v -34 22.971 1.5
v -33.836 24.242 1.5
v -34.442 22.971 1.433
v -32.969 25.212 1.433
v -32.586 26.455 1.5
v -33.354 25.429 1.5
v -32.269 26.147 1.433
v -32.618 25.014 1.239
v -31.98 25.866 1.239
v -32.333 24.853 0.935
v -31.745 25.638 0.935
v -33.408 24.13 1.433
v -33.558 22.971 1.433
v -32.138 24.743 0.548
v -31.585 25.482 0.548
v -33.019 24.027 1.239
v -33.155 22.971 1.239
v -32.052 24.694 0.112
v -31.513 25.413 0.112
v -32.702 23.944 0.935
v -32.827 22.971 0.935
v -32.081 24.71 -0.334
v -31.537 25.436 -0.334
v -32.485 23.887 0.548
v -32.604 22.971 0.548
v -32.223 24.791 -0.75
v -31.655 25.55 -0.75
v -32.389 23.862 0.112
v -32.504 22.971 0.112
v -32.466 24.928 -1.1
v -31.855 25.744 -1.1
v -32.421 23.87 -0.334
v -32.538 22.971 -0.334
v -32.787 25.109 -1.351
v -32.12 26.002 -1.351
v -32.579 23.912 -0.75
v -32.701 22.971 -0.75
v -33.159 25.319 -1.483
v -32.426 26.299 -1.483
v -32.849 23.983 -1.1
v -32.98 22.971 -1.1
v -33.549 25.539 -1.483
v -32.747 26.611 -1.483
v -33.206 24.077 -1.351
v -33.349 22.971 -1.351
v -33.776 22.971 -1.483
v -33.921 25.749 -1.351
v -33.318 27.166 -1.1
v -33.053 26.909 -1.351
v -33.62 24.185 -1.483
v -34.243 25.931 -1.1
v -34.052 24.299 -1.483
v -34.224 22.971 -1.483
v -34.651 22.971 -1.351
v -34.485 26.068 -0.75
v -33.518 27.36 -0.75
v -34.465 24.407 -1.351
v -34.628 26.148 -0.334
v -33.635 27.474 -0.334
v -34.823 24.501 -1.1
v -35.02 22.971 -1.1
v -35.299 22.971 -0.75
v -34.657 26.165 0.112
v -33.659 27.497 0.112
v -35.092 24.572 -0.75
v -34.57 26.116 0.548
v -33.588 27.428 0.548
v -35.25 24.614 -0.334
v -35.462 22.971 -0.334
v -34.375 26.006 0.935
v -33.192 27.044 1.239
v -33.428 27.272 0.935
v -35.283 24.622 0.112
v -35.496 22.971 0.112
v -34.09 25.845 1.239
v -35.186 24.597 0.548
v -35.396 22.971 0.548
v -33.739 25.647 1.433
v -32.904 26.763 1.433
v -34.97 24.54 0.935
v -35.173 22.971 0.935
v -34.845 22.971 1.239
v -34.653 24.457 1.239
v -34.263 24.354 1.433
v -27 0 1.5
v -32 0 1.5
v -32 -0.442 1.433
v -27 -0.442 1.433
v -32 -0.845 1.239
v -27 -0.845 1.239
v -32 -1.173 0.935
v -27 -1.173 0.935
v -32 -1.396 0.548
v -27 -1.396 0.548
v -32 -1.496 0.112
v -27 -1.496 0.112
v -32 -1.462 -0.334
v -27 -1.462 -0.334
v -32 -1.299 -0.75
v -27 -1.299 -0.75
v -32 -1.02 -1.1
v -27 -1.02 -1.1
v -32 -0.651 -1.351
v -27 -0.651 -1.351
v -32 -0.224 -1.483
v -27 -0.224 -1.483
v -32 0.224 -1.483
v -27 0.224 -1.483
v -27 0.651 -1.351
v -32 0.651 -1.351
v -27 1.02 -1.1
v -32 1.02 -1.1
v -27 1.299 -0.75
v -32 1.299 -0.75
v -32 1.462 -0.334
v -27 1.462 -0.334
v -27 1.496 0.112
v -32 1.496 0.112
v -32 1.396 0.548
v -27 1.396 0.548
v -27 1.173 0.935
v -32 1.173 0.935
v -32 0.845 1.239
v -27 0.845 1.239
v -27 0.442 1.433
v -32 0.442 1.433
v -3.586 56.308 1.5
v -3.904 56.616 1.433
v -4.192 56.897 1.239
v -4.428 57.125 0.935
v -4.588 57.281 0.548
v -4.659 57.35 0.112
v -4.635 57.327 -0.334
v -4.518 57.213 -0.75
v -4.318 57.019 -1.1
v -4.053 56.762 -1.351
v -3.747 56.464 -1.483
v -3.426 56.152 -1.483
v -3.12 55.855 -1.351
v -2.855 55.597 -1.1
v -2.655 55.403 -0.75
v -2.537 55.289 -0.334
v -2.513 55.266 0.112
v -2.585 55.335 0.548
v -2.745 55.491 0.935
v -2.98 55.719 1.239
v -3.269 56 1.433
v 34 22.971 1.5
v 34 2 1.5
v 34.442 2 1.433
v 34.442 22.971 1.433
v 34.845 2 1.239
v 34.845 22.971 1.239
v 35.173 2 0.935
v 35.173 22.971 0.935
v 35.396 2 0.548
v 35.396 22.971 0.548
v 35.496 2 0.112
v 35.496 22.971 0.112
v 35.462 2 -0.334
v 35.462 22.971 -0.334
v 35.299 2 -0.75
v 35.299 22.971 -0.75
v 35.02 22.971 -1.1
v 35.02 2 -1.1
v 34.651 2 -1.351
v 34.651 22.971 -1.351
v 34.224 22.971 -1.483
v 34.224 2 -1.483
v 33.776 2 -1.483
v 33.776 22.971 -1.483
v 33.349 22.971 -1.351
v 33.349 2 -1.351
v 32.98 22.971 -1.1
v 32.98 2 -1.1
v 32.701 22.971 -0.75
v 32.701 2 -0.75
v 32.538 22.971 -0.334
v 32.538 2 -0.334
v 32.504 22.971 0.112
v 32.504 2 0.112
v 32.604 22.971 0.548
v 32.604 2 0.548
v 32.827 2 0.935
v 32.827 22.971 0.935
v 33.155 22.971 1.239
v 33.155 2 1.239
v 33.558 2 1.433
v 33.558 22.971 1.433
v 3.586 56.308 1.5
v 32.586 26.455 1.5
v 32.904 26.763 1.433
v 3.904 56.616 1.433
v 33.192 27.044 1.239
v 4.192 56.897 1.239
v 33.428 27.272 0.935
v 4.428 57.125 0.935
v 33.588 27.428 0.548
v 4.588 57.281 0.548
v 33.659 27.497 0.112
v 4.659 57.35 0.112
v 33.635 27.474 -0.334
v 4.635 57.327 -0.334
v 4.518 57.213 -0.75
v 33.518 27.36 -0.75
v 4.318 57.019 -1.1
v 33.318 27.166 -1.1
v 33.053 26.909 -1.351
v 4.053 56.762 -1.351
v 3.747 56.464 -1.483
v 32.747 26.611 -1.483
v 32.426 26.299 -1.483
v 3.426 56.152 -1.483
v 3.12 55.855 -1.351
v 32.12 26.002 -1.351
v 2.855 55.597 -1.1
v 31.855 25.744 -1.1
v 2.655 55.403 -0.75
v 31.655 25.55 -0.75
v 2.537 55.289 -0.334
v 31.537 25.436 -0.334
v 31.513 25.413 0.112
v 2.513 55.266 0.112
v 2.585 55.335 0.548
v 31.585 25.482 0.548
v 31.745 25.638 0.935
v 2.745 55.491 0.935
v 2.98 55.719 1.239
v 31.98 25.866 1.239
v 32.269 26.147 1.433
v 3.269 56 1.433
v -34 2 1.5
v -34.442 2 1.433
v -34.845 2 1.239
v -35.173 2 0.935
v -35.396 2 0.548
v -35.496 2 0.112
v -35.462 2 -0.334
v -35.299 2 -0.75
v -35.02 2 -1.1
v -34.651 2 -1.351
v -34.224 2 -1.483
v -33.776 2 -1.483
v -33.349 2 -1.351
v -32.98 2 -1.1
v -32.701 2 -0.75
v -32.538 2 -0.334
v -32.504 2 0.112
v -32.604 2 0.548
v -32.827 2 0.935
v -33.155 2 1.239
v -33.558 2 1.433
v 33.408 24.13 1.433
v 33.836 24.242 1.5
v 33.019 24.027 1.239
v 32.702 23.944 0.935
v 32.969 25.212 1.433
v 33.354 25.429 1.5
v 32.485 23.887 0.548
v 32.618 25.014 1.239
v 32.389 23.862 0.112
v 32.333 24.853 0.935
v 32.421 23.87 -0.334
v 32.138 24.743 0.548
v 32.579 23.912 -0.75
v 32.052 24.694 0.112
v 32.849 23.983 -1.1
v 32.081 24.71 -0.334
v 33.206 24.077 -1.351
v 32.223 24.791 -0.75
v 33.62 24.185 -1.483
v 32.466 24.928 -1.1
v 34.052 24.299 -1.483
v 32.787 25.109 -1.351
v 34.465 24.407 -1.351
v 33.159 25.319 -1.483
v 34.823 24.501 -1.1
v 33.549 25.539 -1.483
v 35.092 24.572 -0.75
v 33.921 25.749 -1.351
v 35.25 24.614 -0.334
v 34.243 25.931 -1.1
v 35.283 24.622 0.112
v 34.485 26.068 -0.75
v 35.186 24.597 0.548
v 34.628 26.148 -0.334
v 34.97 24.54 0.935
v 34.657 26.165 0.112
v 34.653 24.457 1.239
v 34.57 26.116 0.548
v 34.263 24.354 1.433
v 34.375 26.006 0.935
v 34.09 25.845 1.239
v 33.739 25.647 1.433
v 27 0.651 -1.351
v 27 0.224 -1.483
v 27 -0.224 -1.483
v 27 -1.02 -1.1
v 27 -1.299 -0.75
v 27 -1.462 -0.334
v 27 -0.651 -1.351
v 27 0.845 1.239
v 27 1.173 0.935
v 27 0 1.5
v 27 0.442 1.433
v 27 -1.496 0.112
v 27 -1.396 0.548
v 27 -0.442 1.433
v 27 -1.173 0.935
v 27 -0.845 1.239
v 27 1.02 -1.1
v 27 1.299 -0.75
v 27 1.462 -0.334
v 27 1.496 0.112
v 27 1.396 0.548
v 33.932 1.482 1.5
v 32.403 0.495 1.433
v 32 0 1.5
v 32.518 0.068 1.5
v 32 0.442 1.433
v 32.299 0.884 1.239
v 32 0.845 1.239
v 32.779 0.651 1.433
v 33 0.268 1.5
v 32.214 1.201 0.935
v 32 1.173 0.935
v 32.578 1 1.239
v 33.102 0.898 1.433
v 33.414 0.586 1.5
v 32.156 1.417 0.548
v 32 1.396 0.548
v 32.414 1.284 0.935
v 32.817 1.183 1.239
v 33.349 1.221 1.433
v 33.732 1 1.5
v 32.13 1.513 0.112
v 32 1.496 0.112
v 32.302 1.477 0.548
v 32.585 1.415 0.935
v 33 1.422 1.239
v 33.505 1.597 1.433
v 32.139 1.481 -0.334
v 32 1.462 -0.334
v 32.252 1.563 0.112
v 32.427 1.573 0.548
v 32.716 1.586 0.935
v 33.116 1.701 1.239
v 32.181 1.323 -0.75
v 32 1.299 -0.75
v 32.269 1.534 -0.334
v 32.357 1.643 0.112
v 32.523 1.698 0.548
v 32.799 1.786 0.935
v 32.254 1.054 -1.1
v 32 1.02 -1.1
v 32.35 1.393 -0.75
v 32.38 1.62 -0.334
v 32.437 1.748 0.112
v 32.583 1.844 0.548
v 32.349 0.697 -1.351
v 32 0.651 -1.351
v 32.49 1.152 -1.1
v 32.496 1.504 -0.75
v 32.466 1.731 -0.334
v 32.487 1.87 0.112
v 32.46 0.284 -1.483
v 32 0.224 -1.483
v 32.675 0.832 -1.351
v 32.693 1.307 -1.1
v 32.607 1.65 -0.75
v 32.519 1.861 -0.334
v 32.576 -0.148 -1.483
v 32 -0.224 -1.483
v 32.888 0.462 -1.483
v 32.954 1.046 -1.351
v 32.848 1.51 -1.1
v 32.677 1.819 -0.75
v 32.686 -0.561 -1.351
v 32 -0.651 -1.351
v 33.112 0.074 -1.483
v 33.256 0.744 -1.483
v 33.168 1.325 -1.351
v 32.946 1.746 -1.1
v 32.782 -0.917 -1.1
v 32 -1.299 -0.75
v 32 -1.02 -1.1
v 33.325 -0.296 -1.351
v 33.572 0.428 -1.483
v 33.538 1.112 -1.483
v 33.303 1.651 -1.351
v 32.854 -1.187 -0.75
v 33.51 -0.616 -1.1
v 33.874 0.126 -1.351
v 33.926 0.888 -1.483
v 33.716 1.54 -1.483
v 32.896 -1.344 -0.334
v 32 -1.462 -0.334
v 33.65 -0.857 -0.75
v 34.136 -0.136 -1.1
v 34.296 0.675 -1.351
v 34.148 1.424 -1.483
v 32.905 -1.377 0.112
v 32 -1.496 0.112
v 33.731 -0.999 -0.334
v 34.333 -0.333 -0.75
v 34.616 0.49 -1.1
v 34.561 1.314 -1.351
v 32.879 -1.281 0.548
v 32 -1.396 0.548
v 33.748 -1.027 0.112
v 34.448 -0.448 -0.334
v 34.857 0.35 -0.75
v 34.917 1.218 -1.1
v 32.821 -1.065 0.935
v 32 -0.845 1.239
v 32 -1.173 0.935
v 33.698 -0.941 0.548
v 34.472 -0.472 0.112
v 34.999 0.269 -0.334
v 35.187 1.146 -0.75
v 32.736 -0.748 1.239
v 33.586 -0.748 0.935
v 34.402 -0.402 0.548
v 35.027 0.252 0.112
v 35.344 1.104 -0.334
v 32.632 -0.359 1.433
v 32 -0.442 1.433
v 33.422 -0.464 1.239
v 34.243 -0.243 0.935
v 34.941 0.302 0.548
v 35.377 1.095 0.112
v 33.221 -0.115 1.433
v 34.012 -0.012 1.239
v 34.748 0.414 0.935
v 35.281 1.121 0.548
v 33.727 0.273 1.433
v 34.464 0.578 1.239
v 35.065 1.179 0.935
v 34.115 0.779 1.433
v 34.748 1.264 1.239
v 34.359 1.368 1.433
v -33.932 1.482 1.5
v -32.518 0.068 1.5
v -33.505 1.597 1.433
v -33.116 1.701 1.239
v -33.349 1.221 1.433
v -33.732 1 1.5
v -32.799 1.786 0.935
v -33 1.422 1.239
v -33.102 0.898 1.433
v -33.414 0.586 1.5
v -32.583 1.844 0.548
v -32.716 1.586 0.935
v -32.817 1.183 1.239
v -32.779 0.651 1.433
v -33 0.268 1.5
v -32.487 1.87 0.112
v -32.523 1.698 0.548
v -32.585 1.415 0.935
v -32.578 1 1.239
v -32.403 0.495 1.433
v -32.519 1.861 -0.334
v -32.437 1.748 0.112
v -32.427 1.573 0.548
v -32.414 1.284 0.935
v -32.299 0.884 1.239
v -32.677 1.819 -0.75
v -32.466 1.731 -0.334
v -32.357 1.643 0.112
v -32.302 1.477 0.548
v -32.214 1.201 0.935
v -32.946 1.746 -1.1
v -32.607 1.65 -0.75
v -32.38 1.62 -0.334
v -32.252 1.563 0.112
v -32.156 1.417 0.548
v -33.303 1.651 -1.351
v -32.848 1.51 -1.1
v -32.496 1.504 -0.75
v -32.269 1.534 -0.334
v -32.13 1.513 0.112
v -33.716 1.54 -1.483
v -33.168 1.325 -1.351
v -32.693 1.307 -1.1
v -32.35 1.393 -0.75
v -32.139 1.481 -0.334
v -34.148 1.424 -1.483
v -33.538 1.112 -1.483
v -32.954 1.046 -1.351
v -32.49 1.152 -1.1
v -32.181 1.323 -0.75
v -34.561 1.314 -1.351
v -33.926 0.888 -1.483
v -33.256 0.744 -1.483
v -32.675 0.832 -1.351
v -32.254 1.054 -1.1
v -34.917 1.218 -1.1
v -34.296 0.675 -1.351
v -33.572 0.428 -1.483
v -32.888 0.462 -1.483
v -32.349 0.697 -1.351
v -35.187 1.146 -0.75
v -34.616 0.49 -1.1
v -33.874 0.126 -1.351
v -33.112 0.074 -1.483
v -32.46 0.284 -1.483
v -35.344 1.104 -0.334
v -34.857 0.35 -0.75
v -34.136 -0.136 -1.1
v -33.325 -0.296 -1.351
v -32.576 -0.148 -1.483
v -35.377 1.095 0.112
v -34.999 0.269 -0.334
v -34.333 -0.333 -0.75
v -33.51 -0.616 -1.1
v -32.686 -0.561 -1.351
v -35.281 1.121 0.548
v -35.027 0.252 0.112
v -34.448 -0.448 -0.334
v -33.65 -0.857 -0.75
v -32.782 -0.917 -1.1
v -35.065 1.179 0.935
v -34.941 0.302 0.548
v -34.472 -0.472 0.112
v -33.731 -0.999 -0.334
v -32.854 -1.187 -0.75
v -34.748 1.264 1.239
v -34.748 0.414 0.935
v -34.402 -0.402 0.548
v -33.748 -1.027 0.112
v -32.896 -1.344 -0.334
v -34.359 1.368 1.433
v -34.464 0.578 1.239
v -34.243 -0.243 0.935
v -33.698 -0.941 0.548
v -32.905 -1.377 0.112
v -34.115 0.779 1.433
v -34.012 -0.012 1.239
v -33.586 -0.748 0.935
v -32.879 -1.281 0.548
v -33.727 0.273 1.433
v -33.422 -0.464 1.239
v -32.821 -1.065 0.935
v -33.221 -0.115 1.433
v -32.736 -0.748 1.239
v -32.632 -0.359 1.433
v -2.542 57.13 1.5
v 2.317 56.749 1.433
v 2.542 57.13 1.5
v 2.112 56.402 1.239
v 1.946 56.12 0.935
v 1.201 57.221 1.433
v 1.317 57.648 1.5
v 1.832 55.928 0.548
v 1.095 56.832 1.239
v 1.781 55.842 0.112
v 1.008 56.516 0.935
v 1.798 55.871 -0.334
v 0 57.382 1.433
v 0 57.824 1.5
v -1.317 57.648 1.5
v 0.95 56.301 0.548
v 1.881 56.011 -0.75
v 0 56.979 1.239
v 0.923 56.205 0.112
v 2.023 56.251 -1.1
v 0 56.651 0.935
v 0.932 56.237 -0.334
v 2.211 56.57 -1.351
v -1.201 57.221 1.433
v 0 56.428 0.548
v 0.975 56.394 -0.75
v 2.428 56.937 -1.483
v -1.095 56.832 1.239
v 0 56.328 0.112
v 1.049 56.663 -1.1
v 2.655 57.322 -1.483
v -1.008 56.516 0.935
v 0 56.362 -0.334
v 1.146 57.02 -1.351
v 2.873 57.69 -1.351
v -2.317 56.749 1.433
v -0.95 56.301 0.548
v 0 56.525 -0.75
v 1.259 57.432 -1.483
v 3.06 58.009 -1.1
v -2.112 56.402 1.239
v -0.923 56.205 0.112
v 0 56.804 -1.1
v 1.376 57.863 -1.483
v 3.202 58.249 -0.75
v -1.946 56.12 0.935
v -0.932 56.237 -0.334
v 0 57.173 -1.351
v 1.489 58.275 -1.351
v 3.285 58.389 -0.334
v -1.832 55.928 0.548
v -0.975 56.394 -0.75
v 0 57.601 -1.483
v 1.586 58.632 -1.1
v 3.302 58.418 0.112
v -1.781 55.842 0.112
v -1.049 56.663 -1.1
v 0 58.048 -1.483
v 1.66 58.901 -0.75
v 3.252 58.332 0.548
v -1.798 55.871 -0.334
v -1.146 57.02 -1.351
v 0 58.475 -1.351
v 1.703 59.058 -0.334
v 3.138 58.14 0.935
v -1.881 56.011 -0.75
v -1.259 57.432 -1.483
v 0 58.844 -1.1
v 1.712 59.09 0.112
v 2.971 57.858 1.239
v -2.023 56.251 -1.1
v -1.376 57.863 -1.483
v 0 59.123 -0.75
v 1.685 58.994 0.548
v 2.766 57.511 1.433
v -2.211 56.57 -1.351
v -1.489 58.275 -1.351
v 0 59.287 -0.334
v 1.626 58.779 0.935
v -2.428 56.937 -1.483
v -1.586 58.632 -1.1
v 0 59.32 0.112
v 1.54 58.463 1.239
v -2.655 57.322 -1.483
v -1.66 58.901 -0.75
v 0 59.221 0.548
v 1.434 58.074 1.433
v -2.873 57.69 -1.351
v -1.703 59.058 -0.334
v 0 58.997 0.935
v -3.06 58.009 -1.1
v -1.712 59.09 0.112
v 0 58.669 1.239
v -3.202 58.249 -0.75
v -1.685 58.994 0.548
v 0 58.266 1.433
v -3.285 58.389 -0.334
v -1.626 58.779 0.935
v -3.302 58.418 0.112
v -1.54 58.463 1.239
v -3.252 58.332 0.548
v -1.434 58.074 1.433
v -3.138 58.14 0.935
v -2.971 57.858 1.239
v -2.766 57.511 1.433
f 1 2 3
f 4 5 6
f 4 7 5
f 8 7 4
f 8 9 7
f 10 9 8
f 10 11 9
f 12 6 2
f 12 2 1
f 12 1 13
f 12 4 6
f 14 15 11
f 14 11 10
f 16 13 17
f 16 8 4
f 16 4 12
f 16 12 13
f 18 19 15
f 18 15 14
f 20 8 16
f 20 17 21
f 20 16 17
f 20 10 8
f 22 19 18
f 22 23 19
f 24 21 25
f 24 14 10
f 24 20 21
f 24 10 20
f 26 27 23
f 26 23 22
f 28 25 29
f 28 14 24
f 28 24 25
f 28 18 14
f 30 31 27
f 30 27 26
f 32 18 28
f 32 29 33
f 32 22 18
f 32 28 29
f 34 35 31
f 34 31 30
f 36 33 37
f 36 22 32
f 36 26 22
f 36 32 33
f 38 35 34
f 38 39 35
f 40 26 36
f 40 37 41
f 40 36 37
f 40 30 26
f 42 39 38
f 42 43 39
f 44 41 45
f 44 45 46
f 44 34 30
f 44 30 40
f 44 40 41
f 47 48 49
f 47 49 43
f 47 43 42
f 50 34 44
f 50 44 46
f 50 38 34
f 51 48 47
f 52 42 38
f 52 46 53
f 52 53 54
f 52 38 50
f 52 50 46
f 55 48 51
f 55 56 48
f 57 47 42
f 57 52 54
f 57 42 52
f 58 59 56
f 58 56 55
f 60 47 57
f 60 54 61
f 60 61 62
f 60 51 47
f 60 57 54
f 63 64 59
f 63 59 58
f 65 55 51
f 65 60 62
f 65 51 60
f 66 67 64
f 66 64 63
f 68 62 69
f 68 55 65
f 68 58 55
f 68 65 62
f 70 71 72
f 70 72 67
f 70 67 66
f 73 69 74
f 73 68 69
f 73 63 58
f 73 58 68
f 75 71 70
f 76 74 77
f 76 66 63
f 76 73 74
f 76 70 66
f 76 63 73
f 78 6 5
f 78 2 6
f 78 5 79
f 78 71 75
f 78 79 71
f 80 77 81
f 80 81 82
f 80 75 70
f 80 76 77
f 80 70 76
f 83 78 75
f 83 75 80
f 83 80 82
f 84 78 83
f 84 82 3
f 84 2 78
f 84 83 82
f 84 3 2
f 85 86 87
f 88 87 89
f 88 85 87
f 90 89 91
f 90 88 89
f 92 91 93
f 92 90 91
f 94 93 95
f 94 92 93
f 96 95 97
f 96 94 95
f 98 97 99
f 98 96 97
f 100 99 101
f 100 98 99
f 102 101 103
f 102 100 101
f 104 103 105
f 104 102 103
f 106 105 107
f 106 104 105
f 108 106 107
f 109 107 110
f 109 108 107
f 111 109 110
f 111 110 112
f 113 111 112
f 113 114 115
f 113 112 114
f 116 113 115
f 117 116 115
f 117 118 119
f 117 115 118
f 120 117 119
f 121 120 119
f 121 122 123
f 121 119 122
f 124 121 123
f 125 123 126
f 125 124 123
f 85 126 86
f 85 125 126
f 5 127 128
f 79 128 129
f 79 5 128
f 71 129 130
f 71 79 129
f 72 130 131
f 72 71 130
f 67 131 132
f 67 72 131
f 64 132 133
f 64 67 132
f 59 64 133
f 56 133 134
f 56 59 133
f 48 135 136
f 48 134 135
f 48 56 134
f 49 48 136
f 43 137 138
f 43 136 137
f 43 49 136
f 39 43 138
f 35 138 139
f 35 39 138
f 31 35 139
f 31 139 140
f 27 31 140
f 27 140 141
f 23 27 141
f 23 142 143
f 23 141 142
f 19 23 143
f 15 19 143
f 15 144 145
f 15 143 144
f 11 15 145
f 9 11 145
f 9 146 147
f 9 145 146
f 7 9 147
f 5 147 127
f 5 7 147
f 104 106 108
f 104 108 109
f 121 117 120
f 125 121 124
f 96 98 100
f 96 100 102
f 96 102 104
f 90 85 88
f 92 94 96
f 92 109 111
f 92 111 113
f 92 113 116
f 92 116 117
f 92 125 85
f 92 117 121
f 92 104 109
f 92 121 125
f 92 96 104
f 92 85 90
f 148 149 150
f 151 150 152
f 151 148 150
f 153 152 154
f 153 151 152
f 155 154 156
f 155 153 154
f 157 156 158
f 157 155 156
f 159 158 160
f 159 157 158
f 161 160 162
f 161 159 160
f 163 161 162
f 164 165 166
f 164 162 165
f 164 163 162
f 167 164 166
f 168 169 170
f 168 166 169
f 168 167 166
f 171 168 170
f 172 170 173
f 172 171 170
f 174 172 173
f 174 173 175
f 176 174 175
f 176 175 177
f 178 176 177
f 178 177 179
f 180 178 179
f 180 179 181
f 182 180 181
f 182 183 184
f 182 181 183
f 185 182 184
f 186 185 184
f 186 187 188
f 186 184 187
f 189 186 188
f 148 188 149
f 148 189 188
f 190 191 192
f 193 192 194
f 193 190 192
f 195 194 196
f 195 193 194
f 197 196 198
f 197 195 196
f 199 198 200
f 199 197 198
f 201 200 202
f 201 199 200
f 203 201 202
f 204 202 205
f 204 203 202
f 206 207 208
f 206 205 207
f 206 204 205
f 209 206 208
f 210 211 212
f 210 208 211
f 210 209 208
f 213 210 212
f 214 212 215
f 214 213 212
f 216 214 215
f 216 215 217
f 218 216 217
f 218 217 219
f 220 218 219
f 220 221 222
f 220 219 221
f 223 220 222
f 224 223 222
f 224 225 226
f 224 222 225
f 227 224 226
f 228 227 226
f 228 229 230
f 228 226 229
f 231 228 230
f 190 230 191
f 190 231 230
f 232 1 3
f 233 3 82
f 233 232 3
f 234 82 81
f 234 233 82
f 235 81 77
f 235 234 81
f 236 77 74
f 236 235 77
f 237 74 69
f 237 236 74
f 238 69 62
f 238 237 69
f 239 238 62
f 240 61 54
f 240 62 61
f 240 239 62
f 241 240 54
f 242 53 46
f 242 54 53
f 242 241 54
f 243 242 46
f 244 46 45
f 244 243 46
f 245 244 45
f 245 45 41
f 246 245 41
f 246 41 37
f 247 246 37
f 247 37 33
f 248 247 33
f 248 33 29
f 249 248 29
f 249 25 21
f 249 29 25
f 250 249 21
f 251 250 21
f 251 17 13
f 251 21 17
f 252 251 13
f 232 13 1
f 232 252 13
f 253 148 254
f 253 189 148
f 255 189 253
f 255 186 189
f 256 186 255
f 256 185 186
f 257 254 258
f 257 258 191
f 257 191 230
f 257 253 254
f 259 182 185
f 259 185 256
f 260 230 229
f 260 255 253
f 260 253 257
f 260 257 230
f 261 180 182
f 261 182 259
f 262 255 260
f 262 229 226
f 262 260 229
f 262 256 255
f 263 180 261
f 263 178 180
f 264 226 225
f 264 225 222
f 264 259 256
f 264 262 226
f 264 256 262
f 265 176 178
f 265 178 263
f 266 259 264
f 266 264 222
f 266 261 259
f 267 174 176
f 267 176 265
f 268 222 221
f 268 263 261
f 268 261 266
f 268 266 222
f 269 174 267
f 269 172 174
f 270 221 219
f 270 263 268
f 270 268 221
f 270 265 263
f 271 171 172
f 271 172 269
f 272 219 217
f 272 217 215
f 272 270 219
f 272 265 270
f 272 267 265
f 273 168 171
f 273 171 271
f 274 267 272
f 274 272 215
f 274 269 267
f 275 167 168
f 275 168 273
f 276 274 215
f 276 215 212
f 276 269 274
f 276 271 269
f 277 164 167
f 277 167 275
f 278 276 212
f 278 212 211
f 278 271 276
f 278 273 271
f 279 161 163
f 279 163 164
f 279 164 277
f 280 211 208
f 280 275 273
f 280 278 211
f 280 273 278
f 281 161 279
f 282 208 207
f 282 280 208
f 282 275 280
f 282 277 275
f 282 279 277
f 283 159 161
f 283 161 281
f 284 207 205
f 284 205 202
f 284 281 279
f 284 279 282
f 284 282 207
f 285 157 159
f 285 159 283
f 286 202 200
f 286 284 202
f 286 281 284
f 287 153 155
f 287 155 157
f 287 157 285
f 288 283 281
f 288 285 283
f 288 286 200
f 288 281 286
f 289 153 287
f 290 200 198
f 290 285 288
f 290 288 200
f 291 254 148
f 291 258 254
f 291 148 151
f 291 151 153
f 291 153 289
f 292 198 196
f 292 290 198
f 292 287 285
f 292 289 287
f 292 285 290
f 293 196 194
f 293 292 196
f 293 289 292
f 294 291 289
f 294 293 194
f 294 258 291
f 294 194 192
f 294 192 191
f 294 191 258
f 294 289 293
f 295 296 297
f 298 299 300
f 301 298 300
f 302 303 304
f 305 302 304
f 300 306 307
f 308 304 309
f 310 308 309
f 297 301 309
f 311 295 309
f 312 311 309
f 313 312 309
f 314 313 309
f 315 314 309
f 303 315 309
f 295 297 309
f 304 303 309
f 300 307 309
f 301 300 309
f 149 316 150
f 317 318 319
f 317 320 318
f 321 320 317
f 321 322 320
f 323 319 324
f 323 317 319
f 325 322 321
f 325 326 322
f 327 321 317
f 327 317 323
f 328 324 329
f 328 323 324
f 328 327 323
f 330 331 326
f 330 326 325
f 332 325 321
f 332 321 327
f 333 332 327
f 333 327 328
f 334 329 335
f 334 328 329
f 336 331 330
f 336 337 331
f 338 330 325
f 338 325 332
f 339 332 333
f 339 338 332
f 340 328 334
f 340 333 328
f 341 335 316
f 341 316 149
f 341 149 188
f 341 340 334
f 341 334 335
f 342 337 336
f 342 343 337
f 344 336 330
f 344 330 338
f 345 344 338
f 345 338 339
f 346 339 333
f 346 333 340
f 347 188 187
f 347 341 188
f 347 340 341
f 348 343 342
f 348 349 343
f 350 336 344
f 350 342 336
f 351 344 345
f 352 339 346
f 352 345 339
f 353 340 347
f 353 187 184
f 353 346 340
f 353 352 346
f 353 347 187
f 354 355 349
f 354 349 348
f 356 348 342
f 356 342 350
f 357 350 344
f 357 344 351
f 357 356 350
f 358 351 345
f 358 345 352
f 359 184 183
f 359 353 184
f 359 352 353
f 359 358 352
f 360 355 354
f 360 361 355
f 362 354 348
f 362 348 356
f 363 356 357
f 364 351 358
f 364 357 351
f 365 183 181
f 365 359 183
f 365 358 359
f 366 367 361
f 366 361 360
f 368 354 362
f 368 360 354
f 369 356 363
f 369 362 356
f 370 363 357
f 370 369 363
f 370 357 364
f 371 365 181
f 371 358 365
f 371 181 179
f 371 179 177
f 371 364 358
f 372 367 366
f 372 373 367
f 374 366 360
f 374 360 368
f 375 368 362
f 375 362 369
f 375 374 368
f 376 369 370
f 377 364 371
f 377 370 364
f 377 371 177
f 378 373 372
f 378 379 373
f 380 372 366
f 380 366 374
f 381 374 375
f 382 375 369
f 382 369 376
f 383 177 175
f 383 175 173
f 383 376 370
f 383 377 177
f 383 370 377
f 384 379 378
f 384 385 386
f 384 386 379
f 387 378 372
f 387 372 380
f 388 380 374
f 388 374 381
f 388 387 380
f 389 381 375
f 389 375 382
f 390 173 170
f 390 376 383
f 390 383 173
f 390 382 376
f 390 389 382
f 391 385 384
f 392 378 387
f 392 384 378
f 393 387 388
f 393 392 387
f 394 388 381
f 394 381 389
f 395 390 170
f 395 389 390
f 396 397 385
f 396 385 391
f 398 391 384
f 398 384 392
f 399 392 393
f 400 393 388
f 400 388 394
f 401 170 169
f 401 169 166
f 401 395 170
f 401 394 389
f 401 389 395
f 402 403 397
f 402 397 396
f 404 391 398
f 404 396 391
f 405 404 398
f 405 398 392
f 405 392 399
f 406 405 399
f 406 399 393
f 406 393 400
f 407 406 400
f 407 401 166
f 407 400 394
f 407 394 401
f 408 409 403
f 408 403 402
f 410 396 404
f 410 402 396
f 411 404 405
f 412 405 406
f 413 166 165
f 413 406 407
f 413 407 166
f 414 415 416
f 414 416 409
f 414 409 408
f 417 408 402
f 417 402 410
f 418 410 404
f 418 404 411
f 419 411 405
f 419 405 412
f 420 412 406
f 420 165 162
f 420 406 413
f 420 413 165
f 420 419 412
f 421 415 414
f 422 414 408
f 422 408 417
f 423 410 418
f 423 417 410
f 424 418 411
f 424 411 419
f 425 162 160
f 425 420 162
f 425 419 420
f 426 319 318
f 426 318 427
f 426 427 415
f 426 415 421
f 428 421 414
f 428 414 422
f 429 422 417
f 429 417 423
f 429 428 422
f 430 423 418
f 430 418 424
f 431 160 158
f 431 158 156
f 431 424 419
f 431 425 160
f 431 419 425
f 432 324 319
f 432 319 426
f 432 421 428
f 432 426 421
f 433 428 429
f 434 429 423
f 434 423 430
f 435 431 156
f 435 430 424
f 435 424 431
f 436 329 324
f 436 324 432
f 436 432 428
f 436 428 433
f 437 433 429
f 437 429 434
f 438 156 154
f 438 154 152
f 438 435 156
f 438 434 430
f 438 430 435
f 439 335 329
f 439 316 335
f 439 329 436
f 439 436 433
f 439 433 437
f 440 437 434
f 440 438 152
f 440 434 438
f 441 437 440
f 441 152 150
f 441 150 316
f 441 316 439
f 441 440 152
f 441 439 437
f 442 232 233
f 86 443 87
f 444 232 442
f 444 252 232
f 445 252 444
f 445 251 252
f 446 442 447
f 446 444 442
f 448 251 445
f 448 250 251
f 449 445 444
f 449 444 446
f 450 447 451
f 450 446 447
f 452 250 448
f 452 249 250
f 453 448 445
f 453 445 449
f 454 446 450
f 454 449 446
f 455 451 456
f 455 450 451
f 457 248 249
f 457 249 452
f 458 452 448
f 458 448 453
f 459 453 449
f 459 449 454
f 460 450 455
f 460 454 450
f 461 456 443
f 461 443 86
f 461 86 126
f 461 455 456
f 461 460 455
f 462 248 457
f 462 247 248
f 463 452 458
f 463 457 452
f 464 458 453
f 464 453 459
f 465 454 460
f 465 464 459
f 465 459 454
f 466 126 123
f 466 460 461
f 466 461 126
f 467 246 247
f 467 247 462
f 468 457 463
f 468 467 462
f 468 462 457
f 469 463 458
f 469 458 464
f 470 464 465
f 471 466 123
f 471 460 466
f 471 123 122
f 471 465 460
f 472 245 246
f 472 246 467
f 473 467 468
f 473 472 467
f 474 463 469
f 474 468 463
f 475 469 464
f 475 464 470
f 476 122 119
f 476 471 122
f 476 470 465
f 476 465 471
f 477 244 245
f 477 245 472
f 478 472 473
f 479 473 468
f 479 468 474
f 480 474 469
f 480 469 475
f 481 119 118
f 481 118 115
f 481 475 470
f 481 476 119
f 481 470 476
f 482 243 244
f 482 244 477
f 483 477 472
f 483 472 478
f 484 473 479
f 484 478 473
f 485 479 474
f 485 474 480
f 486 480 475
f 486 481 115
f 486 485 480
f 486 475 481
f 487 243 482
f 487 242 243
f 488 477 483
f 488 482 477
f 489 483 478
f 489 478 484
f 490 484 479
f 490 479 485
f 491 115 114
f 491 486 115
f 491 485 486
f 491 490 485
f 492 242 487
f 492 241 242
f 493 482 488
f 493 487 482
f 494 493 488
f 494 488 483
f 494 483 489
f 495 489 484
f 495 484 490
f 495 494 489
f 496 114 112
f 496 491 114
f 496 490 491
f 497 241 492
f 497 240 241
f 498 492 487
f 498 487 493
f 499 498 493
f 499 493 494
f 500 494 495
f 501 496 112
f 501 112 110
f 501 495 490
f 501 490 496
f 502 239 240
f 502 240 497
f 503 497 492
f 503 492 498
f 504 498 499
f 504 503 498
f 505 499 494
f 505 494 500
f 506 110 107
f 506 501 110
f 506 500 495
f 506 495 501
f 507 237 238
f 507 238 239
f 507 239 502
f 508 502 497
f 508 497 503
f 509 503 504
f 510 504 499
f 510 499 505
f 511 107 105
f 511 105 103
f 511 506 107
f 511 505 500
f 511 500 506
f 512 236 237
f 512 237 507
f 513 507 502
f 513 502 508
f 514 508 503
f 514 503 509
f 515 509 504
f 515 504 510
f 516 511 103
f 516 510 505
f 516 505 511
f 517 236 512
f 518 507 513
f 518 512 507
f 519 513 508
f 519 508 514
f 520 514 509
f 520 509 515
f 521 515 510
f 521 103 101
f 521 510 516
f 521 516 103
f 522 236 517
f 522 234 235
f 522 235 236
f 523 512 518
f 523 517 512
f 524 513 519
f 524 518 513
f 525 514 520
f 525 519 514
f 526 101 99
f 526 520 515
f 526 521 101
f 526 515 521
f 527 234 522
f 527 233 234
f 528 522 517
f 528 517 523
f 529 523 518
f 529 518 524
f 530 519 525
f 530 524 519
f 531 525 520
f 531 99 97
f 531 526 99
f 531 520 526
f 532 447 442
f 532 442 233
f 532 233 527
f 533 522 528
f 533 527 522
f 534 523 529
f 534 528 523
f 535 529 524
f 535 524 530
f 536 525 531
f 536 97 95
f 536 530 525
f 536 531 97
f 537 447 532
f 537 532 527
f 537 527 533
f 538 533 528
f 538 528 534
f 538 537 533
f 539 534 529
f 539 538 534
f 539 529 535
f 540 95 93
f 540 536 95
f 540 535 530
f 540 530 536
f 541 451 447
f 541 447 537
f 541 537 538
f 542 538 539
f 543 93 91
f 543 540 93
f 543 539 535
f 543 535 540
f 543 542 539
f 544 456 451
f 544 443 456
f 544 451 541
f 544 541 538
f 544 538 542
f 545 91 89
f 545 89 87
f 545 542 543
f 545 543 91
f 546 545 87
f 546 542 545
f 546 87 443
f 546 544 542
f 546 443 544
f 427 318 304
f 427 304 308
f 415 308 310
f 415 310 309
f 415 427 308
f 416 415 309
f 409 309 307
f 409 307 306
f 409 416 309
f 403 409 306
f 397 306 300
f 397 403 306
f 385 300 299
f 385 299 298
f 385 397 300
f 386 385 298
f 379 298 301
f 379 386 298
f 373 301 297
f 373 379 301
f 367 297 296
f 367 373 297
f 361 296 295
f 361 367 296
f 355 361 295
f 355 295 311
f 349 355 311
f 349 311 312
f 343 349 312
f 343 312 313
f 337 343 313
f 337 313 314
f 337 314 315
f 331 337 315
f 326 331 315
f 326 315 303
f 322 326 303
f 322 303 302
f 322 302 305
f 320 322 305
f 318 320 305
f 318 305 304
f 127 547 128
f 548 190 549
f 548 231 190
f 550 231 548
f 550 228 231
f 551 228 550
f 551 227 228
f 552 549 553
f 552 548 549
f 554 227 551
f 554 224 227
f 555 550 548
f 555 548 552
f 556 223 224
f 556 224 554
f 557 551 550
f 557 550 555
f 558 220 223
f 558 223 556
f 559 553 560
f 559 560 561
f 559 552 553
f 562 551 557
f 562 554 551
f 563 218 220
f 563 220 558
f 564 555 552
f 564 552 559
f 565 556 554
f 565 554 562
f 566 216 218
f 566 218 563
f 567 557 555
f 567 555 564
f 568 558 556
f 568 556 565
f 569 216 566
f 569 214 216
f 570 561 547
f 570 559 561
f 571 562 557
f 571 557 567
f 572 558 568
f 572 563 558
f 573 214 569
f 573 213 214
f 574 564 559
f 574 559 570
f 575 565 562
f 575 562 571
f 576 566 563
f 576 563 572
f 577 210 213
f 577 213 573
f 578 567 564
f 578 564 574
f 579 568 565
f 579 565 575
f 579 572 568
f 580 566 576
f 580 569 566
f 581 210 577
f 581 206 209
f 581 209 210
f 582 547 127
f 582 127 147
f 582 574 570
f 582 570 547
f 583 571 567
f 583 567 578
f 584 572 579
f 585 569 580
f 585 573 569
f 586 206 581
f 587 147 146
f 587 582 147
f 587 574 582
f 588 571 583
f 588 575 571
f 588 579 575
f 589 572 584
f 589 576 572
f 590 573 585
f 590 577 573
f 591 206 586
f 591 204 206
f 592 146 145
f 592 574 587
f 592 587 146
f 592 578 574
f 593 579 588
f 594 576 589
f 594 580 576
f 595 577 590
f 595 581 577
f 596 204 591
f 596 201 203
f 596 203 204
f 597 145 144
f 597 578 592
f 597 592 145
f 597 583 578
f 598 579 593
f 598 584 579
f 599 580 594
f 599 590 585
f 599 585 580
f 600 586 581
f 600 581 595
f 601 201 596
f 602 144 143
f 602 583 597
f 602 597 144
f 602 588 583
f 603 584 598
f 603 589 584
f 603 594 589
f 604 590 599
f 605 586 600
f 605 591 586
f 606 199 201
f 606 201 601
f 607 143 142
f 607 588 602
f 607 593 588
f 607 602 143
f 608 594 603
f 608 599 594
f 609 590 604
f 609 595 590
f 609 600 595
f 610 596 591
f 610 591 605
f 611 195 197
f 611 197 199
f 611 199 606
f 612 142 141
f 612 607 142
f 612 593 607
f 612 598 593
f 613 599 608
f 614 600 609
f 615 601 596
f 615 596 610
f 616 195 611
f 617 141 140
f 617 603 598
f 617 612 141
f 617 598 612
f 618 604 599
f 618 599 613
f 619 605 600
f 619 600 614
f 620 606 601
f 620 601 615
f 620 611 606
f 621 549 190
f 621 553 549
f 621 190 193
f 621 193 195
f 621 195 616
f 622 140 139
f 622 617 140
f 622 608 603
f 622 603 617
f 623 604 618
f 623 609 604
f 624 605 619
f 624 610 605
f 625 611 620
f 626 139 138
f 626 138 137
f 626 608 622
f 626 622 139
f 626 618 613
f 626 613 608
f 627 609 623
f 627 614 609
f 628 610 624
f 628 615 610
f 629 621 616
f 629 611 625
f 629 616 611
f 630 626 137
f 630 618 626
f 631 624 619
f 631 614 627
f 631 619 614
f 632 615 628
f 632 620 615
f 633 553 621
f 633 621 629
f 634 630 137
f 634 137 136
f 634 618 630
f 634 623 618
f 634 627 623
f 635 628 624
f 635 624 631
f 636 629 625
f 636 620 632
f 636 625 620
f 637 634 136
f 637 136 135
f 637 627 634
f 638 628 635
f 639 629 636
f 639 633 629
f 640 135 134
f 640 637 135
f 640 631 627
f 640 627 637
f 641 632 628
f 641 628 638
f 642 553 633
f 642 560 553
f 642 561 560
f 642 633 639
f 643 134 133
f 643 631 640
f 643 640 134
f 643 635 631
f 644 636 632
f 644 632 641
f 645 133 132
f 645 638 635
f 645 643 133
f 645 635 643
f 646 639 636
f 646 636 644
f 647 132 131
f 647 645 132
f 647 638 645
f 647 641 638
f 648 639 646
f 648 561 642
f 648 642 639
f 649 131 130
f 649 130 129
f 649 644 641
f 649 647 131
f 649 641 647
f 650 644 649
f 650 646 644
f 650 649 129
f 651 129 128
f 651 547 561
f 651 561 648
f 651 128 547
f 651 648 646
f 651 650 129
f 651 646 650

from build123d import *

# Parameters (mm, degrees)
SWEEP2_PROFILE_R = 1.5


with BuildPart() as part:
    # Sweep2: sweep along a path in Sketch1
    with BuildLine(Plane.XY) as sweep2_path:
        Line((27, 0), (32, 0))
        ThreePointArc((32, 0), (33.414213562, 0.585786438), (34, 2))
        Line((34, 2), (34, 22.971251236))
        ThreePointArc((34, 22.971251236), (33.633140648, 24.851146908), (32.586396904, 26.455179657))
        Line((32.586396904, 26.455179657), (3.586396904, 56.308120834))
        ThreePointArc((3.586396904, 56.308120834), (0, 57.824192412), (-3.586396904, 56.308120834))
        Line((-3.586396904, 56.308120834), (-32.586396904, 26.455179657))
        ThreePointArc((-32.586396904, 26.455179657), (-33.633140648, 24.851146908), (-34, 22.971251236))
        Line((-34, 22.971251236), (-34, 2))
        ThreePointArc((-34, 2), (-33.414213562, 0.585786438), (-32, 0))
        Line((-32, 0), (-27, 0))
    # Sweep2 profile (on start of the path) → Sweep2 (sweep)
    with BuildSketch(Plane(origin=(27, 0, 0), x_dir=(0, 0, 1), z_dir=(1, 0, 0))):
        Circle(SWEEP2_PROFILE_R)
    sweep(path=sweep2_path.line)


solid = part.part
